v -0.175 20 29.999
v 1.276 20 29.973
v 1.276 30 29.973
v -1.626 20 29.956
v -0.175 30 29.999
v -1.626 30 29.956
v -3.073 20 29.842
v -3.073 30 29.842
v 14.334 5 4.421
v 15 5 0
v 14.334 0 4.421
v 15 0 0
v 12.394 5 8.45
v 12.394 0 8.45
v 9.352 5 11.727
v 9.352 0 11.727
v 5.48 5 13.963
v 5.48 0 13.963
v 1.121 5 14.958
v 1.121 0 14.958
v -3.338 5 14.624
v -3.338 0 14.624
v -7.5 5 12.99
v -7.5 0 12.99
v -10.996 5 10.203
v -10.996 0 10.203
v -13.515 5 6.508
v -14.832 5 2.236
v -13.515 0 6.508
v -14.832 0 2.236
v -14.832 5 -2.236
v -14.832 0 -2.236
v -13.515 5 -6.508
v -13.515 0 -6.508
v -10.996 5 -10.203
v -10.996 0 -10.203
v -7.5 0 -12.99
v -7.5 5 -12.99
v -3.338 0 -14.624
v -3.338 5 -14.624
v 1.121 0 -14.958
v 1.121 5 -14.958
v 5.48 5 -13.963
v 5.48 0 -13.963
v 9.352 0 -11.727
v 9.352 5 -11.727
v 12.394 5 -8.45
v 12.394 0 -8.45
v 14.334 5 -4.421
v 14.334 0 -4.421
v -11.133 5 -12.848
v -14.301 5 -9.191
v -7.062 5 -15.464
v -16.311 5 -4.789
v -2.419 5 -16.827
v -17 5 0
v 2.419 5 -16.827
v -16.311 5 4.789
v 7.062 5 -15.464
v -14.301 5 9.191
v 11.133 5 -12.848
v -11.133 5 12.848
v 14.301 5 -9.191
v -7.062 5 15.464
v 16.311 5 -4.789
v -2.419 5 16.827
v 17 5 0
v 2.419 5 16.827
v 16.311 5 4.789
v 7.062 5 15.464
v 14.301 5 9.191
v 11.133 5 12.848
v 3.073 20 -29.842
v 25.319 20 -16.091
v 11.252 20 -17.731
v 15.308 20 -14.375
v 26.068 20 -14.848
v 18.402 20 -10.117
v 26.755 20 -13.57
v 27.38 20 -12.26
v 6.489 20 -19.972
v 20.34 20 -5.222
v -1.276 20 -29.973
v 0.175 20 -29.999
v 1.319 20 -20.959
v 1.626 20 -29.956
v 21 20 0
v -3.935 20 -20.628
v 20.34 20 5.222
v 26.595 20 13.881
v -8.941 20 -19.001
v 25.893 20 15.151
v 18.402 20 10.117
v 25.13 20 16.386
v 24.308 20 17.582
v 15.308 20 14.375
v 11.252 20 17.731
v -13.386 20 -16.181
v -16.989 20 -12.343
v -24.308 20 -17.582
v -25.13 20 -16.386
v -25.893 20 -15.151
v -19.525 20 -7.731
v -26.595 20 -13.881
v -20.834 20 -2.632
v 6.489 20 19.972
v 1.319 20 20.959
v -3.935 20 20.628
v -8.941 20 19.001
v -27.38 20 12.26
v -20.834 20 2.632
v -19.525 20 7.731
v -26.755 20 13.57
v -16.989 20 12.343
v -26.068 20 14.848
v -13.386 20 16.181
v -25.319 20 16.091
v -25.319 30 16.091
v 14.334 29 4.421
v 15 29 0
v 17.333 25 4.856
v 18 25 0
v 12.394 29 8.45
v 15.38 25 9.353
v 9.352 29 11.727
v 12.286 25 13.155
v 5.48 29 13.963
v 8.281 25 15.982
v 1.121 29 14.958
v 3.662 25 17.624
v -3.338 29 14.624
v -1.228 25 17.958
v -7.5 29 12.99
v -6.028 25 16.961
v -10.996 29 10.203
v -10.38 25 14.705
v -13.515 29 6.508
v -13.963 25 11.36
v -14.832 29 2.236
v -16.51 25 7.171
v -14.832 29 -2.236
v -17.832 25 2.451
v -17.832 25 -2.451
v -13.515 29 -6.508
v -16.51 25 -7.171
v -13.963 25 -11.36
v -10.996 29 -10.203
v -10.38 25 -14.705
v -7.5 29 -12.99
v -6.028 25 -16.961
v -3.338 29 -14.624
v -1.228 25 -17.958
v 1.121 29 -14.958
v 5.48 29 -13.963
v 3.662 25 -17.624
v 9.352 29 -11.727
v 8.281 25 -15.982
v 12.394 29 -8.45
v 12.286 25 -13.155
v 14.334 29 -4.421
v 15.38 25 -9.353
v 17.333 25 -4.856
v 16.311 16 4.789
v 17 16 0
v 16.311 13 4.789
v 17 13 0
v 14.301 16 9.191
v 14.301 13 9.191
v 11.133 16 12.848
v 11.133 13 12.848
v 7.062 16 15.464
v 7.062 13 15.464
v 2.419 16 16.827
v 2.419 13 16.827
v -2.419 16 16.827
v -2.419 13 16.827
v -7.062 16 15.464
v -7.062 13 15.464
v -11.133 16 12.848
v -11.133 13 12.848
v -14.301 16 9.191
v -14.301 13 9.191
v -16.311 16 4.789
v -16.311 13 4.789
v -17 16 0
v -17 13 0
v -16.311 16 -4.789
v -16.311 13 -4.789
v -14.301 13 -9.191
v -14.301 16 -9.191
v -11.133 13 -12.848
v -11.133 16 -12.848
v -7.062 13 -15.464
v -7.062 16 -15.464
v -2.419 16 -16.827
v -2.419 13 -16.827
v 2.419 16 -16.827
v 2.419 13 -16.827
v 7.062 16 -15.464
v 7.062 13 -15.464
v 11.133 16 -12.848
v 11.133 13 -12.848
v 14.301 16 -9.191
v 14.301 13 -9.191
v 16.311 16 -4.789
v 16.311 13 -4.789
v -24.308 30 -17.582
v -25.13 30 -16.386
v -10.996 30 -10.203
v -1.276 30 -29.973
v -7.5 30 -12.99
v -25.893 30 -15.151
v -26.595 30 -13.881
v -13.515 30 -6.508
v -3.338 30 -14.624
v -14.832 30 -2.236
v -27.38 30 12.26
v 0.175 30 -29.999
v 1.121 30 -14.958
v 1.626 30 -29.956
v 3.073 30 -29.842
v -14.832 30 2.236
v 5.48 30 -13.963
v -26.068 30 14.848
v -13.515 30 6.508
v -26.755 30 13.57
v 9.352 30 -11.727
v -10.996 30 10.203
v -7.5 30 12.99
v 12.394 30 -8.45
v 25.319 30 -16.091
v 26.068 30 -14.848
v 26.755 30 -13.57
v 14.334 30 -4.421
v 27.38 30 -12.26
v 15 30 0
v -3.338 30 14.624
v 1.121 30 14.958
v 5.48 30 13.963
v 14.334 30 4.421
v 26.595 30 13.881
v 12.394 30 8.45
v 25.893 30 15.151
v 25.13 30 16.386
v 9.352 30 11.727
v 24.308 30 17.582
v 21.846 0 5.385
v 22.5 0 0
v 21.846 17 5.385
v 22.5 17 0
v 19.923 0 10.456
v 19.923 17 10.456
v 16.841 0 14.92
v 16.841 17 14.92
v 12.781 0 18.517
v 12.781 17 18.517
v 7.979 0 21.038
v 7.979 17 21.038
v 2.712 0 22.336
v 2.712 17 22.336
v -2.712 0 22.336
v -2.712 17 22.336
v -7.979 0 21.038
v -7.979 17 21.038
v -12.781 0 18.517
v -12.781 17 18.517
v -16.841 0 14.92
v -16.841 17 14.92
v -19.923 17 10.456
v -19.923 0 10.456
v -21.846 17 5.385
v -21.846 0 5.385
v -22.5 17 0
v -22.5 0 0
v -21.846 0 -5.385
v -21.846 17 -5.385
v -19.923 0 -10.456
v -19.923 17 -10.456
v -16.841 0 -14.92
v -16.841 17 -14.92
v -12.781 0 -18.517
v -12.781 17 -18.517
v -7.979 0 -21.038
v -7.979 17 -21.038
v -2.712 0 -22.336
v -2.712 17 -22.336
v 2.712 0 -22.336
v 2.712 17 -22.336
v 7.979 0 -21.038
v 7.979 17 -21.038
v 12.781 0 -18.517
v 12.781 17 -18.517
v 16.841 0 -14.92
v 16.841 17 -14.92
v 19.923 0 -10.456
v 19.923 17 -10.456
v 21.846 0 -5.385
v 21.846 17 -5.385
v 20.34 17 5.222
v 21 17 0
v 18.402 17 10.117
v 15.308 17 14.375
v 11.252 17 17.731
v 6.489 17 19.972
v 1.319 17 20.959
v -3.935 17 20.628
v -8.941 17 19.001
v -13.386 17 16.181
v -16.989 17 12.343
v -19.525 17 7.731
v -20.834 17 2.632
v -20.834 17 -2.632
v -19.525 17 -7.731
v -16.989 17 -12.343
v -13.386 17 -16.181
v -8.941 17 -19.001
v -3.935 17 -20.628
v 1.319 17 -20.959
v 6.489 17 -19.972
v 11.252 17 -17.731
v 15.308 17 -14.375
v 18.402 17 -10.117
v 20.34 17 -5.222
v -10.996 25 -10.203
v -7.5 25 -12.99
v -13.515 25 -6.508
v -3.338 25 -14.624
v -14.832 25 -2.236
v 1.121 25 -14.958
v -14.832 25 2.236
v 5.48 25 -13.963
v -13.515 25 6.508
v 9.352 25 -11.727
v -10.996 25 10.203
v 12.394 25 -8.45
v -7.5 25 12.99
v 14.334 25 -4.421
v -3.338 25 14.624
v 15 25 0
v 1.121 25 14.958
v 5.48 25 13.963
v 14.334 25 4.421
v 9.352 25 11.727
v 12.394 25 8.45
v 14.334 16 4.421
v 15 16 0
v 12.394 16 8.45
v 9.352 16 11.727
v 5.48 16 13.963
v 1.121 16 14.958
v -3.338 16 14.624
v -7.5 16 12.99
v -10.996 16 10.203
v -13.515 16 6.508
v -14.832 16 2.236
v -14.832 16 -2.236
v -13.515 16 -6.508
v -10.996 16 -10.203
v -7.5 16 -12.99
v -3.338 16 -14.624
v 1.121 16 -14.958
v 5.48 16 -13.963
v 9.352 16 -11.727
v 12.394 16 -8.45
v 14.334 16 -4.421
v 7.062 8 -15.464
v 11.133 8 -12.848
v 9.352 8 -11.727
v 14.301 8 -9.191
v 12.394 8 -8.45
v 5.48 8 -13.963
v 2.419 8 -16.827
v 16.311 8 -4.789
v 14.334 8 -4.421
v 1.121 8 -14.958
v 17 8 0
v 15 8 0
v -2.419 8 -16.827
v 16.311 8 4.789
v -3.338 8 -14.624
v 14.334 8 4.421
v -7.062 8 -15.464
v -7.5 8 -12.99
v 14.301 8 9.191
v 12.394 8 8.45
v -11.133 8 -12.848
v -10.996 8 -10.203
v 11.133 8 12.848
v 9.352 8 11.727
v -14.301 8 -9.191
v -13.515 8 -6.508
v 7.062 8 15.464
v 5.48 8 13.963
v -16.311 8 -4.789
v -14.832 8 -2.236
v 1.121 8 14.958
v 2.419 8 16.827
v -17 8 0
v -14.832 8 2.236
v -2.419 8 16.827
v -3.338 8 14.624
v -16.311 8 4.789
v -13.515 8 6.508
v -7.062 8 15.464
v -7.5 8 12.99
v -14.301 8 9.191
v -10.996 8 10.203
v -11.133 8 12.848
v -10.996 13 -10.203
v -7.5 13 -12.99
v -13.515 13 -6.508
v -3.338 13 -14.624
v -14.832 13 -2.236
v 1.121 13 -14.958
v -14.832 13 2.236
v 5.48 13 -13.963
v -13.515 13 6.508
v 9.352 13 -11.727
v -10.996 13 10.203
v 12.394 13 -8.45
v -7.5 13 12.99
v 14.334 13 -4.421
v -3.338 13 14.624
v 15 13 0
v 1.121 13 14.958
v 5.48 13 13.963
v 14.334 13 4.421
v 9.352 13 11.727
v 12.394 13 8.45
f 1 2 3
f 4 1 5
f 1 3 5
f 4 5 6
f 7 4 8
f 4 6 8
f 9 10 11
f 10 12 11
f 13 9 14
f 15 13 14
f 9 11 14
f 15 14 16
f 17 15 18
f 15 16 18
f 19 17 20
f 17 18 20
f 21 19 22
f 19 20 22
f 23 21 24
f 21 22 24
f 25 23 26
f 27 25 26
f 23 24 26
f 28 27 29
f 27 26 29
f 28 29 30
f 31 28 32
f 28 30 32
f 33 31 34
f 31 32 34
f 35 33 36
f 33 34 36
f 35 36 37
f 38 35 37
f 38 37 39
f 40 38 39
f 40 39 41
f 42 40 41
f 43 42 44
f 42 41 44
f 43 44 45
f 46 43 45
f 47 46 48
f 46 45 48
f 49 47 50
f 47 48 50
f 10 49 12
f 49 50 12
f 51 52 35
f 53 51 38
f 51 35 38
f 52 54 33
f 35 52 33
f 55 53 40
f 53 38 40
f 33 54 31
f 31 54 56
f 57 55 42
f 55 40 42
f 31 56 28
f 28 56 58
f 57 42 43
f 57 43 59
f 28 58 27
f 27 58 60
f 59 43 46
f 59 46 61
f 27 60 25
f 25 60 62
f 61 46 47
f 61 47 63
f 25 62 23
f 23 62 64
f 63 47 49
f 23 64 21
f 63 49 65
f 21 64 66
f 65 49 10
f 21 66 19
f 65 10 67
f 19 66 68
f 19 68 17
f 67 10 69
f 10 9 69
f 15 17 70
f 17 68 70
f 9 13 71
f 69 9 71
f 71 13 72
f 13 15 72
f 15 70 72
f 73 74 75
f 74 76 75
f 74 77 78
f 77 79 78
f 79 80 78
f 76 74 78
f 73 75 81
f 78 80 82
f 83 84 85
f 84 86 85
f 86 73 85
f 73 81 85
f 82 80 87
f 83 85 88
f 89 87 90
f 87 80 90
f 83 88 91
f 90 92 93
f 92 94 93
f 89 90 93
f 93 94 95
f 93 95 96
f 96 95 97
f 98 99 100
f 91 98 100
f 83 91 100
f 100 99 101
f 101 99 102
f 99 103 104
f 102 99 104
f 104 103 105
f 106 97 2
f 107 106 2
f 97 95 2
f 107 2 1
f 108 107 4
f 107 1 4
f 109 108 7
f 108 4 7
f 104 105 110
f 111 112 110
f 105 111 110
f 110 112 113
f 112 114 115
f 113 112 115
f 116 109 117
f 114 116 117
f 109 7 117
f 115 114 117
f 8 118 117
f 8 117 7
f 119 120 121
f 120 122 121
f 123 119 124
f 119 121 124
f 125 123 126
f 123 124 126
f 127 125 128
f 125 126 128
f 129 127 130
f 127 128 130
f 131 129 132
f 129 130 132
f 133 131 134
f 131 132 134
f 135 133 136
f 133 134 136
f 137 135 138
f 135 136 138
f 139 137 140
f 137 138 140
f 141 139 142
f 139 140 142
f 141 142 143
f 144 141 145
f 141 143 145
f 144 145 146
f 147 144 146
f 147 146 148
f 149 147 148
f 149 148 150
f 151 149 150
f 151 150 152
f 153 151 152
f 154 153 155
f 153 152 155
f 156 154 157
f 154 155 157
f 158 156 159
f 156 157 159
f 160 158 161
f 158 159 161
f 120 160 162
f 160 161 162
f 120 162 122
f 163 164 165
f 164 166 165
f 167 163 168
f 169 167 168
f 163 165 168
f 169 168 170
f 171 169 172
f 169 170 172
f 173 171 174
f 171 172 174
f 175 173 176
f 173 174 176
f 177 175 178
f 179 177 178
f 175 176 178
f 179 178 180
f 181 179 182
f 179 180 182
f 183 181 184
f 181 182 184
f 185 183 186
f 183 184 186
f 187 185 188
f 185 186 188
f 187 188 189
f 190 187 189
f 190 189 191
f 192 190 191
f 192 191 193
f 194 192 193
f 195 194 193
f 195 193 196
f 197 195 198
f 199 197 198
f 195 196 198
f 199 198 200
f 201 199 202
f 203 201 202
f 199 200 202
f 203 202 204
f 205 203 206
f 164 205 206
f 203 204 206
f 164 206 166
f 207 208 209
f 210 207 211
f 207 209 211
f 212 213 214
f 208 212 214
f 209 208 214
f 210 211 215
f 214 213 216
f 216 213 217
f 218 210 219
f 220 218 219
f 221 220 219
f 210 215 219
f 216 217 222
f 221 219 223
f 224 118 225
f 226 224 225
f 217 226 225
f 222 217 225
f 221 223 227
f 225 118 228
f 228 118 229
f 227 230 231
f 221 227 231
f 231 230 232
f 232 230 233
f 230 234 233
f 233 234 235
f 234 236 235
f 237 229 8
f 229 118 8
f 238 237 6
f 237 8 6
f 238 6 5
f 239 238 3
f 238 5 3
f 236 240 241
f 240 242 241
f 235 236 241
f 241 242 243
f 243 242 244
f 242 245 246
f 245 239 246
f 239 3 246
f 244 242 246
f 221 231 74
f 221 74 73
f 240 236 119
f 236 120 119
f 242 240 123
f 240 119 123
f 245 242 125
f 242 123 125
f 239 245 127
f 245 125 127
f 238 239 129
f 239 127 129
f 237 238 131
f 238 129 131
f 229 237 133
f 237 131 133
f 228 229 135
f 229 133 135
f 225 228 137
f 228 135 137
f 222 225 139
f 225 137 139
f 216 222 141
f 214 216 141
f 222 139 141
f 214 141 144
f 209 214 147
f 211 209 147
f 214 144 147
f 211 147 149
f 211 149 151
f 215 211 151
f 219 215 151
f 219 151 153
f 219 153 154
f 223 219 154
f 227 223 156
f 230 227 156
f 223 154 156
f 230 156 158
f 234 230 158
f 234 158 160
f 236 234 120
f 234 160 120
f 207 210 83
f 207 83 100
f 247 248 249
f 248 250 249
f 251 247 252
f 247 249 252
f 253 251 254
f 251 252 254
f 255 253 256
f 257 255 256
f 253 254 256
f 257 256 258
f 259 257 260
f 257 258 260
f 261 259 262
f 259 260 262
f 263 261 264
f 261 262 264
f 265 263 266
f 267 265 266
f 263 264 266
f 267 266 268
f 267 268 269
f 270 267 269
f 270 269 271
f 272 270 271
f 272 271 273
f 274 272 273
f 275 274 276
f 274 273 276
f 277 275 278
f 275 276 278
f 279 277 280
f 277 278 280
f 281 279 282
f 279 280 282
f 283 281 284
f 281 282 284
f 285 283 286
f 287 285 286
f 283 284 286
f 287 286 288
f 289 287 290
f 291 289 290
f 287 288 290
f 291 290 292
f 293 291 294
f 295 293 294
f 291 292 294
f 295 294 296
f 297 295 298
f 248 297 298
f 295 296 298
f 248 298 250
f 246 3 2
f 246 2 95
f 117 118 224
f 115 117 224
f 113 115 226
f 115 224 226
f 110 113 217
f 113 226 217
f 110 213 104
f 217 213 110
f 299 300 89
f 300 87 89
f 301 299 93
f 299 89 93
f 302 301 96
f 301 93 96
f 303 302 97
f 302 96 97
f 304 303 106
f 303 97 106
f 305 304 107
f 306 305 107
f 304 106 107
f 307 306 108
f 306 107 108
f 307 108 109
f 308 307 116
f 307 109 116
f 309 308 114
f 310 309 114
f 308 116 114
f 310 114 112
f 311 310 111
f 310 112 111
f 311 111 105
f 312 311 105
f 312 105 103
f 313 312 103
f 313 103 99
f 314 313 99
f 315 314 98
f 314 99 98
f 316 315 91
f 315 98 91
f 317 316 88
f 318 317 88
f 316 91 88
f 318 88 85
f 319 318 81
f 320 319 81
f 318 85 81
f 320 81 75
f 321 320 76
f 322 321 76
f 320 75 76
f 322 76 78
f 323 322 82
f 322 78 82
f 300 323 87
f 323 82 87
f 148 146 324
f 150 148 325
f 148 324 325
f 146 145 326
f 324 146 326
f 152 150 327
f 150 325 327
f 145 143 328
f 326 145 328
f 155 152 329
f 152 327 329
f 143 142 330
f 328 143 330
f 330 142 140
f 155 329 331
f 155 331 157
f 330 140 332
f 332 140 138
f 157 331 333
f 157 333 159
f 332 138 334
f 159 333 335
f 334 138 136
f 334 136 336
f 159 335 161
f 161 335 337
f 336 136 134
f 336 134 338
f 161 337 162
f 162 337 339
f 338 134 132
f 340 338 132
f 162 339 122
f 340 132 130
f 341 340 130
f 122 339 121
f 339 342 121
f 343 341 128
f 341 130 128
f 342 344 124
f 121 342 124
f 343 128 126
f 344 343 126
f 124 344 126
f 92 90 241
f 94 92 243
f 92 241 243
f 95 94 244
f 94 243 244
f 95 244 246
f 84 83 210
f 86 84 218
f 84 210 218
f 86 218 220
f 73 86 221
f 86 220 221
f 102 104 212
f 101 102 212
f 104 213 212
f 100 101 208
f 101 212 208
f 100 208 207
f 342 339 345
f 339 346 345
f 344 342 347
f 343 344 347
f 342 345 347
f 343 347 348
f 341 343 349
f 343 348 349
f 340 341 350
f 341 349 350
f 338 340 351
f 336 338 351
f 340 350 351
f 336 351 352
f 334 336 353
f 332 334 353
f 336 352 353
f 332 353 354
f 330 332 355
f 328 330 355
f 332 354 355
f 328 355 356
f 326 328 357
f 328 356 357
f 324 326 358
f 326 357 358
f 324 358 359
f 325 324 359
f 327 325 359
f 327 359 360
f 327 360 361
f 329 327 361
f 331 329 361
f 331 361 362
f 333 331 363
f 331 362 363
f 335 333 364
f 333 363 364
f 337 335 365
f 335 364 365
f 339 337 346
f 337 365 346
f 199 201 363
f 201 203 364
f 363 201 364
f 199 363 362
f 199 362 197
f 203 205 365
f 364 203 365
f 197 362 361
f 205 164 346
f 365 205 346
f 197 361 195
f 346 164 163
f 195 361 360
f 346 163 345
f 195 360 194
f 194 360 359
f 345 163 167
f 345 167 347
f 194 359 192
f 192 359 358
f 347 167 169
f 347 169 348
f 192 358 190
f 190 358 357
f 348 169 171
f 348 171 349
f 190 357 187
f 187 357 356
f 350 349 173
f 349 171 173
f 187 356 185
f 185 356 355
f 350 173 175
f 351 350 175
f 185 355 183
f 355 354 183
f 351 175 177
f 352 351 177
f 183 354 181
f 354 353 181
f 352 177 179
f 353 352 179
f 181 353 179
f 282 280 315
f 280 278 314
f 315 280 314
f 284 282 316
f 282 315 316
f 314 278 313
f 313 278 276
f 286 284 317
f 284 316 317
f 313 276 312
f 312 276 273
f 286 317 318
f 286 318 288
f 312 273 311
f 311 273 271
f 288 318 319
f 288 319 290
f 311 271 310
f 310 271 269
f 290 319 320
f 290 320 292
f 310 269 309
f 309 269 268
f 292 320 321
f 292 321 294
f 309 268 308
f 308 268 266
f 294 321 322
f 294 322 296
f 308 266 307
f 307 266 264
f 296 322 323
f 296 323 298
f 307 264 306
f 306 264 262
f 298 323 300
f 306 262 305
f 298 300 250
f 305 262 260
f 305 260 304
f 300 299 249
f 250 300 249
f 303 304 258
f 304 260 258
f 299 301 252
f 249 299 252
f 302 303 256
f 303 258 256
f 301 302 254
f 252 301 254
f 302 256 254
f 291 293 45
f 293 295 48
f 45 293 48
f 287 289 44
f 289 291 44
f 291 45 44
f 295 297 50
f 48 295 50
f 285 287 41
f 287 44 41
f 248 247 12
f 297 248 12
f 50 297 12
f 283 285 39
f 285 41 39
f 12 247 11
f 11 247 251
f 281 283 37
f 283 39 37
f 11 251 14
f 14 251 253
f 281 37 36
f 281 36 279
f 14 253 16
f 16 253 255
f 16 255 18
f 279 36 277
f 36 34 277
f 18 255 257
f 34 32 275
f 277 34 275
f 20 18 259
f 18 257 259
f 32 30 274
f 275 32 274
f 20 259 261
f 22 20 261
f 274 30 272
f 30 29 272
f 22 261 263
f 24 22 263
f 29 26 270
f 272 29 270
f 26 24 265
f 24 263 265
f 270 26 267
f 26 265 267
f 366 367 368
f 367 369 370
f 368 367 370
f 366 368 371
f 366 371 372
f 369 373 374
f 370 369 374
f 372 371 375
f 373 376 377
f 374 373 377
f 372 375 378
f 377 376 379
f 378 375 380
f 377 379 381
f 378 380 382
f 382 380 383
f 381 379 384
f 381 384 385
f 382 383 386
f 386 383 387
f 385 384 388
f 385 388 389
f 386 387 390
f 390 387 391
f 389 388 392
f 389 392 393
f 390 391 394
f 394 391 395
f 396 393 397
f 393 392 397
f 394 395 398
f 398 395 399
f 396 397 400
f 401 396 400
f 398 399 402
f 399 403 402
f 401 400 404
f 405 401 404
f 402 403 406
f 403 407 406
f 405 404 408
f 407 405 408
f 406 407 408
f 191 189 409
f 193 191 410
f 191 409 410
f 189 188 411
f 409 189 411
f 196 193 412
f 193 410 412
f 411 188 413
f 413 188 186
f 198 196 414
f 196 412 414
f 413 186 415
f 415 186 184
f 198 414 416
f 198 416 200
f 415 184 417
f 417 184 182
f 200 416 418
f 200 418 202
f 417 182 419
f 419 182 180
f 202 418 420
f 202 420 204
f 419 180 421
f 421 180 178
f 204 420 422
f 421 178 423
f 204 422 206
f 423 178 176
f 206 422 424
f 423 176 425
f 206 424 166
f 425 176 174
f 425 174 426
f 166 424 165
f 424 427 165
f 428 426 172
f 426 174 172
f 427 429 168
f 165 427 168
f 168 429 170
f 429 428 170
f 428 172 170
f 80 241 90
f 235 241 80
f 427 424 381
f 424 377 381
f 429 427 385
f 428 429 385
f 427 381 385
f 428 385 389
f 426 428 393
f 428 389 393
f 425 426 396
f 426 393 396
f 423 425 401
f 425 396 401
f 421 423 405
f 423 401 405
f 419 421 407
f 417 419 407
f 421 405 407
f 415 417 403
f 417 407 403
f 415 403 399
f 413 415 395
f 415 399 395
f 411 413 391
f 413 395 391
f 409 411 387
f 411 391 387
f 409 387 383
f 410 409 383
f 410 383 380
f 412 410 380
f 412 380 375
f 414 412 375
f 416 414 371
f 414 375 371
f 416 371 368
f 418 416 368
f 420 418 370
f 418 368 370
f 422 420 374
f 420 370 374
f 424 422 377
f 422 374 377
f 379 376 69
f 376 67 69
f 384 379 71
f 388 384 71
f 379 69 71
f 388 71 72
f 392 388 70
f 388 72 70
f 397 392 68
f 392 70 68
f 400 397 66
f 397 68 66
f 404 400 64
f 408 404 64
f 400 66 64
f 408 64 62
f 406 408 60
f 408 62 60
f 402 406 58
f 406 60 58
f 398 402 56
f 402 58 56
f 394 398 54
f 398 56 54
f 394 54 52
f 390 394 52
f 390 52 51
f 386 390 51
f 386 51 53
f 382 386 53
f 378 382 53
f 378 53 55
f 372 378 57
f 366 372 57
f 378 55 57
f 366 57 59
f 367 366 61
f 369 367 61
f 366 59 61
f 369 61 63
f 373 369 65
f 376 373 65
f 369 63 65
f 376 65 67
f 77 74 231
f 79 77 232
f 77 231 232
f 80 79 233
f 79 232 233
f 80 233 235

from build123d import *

# Parameters (mm, degrees)
SKETCH3_OUTSIDE_W  = 80
SKETCH3_OUTSIDE_H  = 80
CUT_EXTRUDE1_DEPTH = 31


with BuildPart() as part:
    # Sketch2 → Revolve1 (revolve)
    with BuildSketch(Plane.XY):
        Polygon((22.5, 0), (22.5, 17), (21, 17), (21, 20), (30, 20), (30, 30), (15, 30), (15, 29), (18, 25), (15, 25), (15, 16), (17, 16), (17, 13), (15, 13), (15, 8), (17, 8), (17, 5), (15, 5), (15, 0), align=None)
    revolve(axis=Axis((0, 16.306451613, 0), (0, -1, 0)))

    # Sketch3 outside → Cut-Extrude1 (cut, through all)
    with BuildSketch(Plane(origin=(0, 30, 0), x_dir=(1, 0, 0), z_dir=(0, 1, 0))):
        Rectangle(SKETCH3_OUTSIDE_W, SKETCH3_OUTSIDE_H)
        Polygon((0.936055849, 31.162859295), (-26.51979988, 16.392077792), (-27.455855728, -14.770781503), (-0.936055849, -31.162859295), (26.51979988, -16.392077792), (27.455855728, 14.770781503), align=None, mode=Mode.SUBTRACT)
    extrude(amount=-CUT_EXTRUDE1_DEPTH, mode=Mode.SUBTRACT)


solid = part.part
